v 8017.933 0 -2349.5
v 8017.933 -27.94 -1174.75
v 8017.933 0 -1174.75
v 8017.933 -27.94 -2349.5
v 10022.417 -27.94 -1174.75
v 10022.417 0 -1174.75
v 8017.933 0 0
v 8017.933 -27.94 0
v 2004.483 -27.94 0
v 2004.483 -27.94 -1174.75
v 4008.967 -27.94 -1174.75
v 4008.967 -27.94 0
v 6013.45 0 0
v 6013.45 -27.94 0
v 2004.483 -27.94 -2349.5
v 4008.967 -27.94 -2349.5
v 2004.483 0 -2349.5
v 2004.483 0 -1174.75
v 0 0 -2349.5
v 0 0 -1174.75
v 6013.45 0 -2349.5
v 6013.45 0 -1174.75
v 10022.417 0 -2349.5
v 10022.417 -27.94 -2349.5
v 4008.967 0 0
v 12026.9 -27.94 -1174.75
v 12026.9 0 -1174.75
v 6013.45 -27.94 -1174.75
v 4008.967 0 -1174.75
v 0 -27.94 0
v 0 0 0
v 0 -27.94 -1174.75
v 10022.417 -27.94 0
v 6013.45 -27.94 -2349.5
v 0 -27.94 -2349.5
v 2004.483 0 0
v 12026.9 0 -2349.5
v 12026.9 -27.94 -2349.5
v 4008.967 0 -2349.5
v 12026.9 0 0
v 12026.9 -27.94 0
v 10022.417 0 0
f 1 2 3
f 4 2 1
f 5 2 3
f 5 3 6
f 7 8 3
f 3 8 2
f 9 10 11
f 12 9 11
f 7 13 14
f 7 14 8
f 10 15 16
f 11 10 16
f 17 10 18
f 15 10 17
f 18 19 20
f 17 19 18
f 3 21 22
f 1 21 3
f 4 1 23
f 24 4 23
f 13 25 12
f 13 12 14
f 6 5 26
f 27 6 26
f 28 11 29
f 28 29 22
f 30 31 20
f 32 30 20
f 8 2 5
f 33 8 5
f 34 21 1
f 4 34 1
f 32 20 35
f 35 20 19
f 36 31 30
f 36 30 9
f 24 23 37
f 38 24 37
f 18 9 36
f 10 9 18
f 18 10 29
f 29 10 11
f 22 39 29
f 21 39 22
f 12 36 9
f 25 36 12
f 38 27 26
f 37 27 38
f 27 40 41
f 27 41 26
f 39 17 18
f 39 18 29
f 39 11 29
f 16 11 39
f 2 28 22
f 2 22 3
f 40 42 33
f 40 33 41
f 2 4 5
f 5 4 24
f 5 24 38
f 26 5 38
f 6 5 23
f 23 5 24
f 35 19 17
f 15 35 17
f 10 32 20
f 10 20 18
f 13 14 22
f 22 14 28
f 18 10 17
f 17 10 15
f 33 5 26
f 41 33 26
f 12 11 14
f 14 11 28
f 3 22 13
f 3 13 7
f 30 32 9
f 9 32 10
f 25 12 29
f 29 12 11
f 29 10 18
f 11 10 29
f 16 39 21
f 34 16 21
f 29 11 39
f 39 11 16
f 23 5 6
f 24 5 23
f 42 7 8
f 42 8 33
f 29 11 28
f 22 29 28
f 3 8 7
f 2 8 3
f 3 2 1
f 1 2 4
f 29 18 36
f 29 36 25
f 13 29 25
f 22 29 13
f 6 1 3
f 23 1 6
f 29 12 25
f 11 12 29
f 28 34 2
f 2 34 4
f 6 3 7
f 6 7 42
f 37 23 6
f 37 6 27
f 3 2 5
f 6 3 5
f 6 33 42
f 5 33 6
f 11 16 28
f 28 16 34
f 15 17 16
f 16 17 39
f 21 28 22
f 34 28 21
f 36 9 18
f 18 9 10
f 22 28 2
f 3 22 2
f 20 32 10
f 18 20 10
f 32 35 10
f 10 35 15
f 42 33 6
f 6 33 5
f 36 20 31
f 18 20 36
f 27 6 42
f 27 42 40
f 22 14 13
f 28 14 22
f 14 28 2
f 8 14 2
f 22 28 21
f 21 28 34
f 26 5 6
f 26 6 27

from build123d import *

# Parameters (mm, degrees)
SKETCH1_W                 = 12026.9
SKETCH1_H                 = 2349.5
BOSS_EXTRUDE1_DEPTH       = 27.94
SPLIT1_SURFACE_1_1_BACK   = 12255.275
SPLIT1_SURFACE_1_1_DEPTH  = 24510.55
SPLIT1_SURFACE_1_2_BACK   = 12255.275
SPLIT1_SURFACE_1_2_DEPTH  = 24510.55
SPLIT1_SURFACE_2_3_BACK   = 12255.275
SPLIT1_SURFACE_2_3_DEPTH  = 24510.55
SPLIT1_SURFACE_2_4_BACK   = 12255.275
SPLIT1_SURFACE_2_4_DEPTH  = 24510.55
SPLIT1_SURFACE_2_5_BACK   = 12255.275
SPLIT1_SURFACE_2_5_DEPTH  = 24510.55
SPLIT1_SURFACE_2_6_BACK   = 12255.275
SPLIT1_SURFACE_2_6_DEPTH  = 24510.55
SPLIT1_SURFACE_3_7_BACK   = 12255.275
SPLIT1_SURFACE_3_7_DEPTH  = 24510.55
SPLIT1_SURFACE_3_8_BACK   = 12255.275
SPLIT1_SURFACE_3_8_DEPTH  = 24510.55
SPLIT1_SURFACE_3_9_BACK   = 12255.275
SPLIT1_SURFACE_3_9_DEPTH  = 24510.55
SPLIT1_SURFACE_3_10_BACK  = 12255.275
SPLIT1_SURFACE_3_10_DEPTH = 24510.55
SPLIT1_SURFACE_4_11_BACK  = 12255.275
SPLIT1_SURFACE_4_11_DEPTH = 24510.55
SPLIT1_SURFACE_4_12_BACK  = 12255.275
SPLIT1_SURFACE_4_12_DEPTH = 24510.55
SPLIT1_SURFACE_4_13_BACK  = 12255.275
SPLIT1_SURFACE_4_13_DEPTH = 24510.55
SPLIT1_SURFACE_4_14_BACK  = 12255.275
SPLIT1_SURFACE_4_14_DEPTH = 24510.55
SPLIT1_SURFACE_5_15_BACK  = 12255.275
SPLIT1_SURFACE_5_15_DEPTH = 24510.55
SPLIT1_SURFACE_5_16_BACK  = 12255.275
SPLIT1_SURFACE_5_16_DEPTH = 24510.55
SPLIT1_SURFACE_5_17_BACK  = 12255.275
SPLIT1_SURFACE_5_17_DEPTH = 24510.55
SPLIT1_SURFACE_5_18_BACK  = 12255.275
SPLIT1_SURFACE_5_18_DEPTH = 24510.55
SPLIT1_SURFACE_6_19_BACK  = 12255.275
SPLIT1_SURFACE_6_19_DEPTH = 24510.55
SPLIT1_SURFACE_6_20_BACK  = 12255.275
SPLIT1_SURFACE_6_20_DEPTH = 24510.55
SPLIT1_SURFACE_6_21_BACK  = 12255.275
SPLIT1_SURFACE_6_21_DEPTH = 24510.55
SPLIT1_SURFACE_6_22_BACK  = 12255.275
SPLIT1_SURFACE_6_22_DEPTH = 24510.55


with BuildPart() as part:
    # Sketch1 → Boss-Extrude1 (new body)
    with BuildSketch(Plane(origin=(0, 0, 0), x_dir=(1, 0, 0), z_dir=(0, 1, 0))):
        with Locations((6013.45, 1174.75)):
            Rectangle(SKETCH1_W, SKETCH1_H)
    extrude(amount=-BOSS_EXTRUDE1_DEPTH)


with BuildPart() as body_2:
    # Split1: the piece behind the surface
    add(part.part)
    # Split1 surface 1: a surface, the sketch's curves swept straight by 24510.55 mm
    with BuildLine(Plane(origin=(0, 0, 0), x_dir=(1, 0, 0), z_dir=(0, 1, 0)).offset(-SPLIT1_SURFACE_1_1_BACK), mode=Mode.PRIVATE) as split1_surface_1_1_path:
        Line((0, 1174.75), (12026.9, 1174.75))
    split1_surface_1_1 = Shell.extrude(split1_surface_1_1_path.wire(), (0 * SPLIT1_SURFACE_1_1_DEPTH, 1 * SPLIT1_SURFACE_1_1_DEPTH, 0 * SPLIT1_SURFACE_1_1_DEPTH))
    split(bisect_by=split1_surface_1_1, keep=Keep.BOTTOM)


with BuildPart() as part_1:
    add(part.part)

    # Split1: split by a surface, the side it looks to stays
    # Split1 surface 1: a surface, the sketch's curves swept straight by 24510.55 mm
    with BuildLine(Plane(origin=(0, 0, 0), x_dir=(1, 0, 0), z_dir=(0, 1, 0)).offset(-SPLIT1_SURFACE_1_2_BACK), mode=Mode.PRIVATE) as split1_surface_1_2_path:
        Line((0, 1174.75), (12026.9, 1174.75))
    split1_surface_1_2 = Shell.extrude(split1_surface_1_2_path.wire(), (0 * SPLIT1_SURFACE_1_2_DEPTH, 1 * SPLIT1_SURFACE_1_2_DEPTH, 0 * SPLIT1_SURFACE_1_2_DEPTH))
    split(bisect_by=split1_surface_1_2, keep=Keep.TOP)


with BuildPart() as body_3:
    # Split1 2: the piece behind the surface
    add(part_1.part)
    # Split1 surface 2: a surface, the sketch's curves swept straight by 24510.55 mm
    with BuildLine(Plane(origin=(0, 0, 0), x_dir=(1, 0, 0), z_dir=(0, 1, 0)).offset(-SPLIT1_SURFACE_2_3_BACK), mode=Mode.PRIVATE) as split1_surface_2_3_path:
        Line((2004.483333333, 0), (2004.483333333, 2349.5))
    split1_surface_2_3 = Shell.extrude(split1_surface_2_3_path.wire(), (0 * SPLIT1_SURFACE_2_3_DEPTH, 1 * SPLIT1_SURFACE_2_3_DEPTH, 0 * SPLIT1_SURFACE_2_3_DEPTH))
    split(bisect_by=split1_surface_2_3, keep=Keep.BOTTOM)


with BuildPart() as part_2:
    add(part_1.part)

    # Split1 2: split by a surface, the side it looks to stays
    # Split1 surface 2: a surface, the sketch's curves swept straight by 24510.55 mm
    with BuildLine(Plane(origin=(0, 0, 0), x_dir=(1, 0, 0), z_dir=(0, 1, 0)).offset(-SPLIT1_SURFACE_2_4_BACK), mode=Mode.PRIVATE) as split1_surface_2_4_path:
        Line((2004.483333333, 0), (2004.483333333, 2349.5))
    split1_surface_2_4 = Shell.extrude(split1_surface_2_4_path.wire(), (0 * SPLIT1_SURFACE_2_4_DEPTH, 1 * SPLIT1_SURFACE_2_4_DEPTH, 0 * SPLIT1_SURFACE_2_4_DEPTH))
    split(bisect_by=split1_surface_2_4, keep=Keep.TOP)


with BuildPart() as body_4:
    # Split1 2 body 2: the piece behind the surface
    add(body_2.part)
    # Split1 surface 2: a surface, the sketch's curves swept straight by 24510.55 mm
    with BuildLine(Plane(origin=(0, 0, 0), x_dir=(1, 0, 0), z_dir=(0, 1, 0)).offset(-SPLIT1_SURFACE_2_5_BACK), mode=Mode.PRIVATE) as split1_surface_2_5_path:
        Line((2004.483333333, 0), (2004.483333333, 2349.5))
    split1_surface_2_5 = Shell.extrude(split1_surface_2_5_path.wire(), (0 * SPLIT1_SURFACE_2_5_DEPTH, 1 * SPLIT1_SURFACE_2_5_DEPTH, 0 * SPLIT1_SURFACE_2_5_DEPTH))
    split(bisect_by=split1_surface_2_5, keep=Keep.BOTTOM)


with BuildPart() as body_2_1:
    add(body_2.part)

    # Split1 2 body 2: split by a surface, the side it looks to stays
    # Split1 surface 2: a surface, the sketch's curves swept straight by 24510.55 mm
    with BuildLine(Plane(origin=(0, 0, 0), x_dir=(1, 0, 0), z_dir=(0, 1, 0)).offset(-SPLIT1_SURFACE_2_6_BACK), mode=Mode.PRIVATE) as split1_surface_2_6_path:
        Line((2004.483333333, 0), (2004.483333333, 2349.5))
    split1_surface_2_6 = Shell.extrude(split1_surface_2_6_path.wire(), (0 * SPLIT1_SURFACE_2_6_DEPTH, 1 * SPLIT1_SURFACE_2_6_DEPTH, 0 * SPLIT1_SURFACE_2_6_DEPTH))
    split(bisect_by=split1_surface_2_6, keep=Keep.TOP)


with BuildPart() as body_5:
    # Split1 3 body 3: the piece behind the surface
    add(body_3.part)
    # Split1 surface 3: a surface, the sketch's curves swept straight by 24510.55 mm
    with BuildLine(Plane(origin=(0, 0, 0), x_dir=(1, 0, 0), z_dir=(0, 1, 0)).offset(-SPLIT1_SURFACE_3_7_BACK), mode=Mode.PRIVATE) as split1_surface_3_7_path:
        Line((4008.966666667, 0), (4008.966666667, 2349.5))
    split1_surface_3_7 = Shell.extrude(split1_surface_3_7_path.wire(), (0 * SPLIT1_SURFACE_3_7_DEPTH, 1 * SPLIT1_SURFACE_3_7_DEPTH, 0 * SPLIT1_SURFACE_3_7_DEPTH))
    split(bisect_by=split1_surface_3_7, keep=Keep.BOTTOM)


with BuildPart() as body_3_1:
    add(body_3.part)

    # Split1 3 body 3: split by a surface, the side it looks to stays
    # Split1 surface 3: a surface, the sketch's curves swept straight by 24510.55 mm
    with BuildLine(Plane(origin=(0, 0, 0), x_dir=(1, 0, 0), z_dir=(0, 1, 0)).offset(-SPLIT1_SURFACE_3_8_BACK), mode=Mode.PRIVATE) as split1_surface_3_8_path:
        Line((4008.966666667, 0), (4008.966666667, 2349.5))
    split1_surface_3_8 = Shell.extrude(split1_surface_3_8_path.wire(), (0 * SPLIT1_SURFACE_3_8_DEPTH, 1 * SPLIT1_SURFACE_3_8_DEPTH, 0 * SPLIT1_SURFACE_3_8_DEPTH))
    split(bisect_by=split1_surface_3_8, keep=Keep.TOP)


with BuildPart() as body_6:
    # Split1 3 body 4: the piece behind the surface
    add(body_4.part)
    # Split1 surface 3: a surface, the sketch's curves swept straight by 24510.55 mm
    with BuildLine(Plane(origin=(0, 0, 0), x_dir=(1, 0, 0), z_dir=(0, 1, 0)).offset(-SPLIT1_SURFACE_3_9_BACK), mode=Mode.PRIVATE) as split1_surface_3_9_path:
        Line((4008.966666667, 0), (4008.966666667, 2349.5))
    split1_surface_3_9 = Shell.extrude(split1_surface_3_9_path.wire(), (0 * SPLIT1_SURFACE_3_9_DEPTH, 1 * SPLIT1_SURFACE_3_9_DEPTH, 0 * SPLIT1_SURFACE_3_9_DEPTH))
    split(bisect_by=split1_surface_3_9, keep=Keep.BOTTOM)


with BuildPart() as body_4_1:
    add(body_4.part)

    # Split1 3 body 4: split by a surface, the side it looks to stays
    # Split1 surface 3: a surface, the sketch's curves swept straight by 24510.55 mm
    with BuildLine(Plane(origin=(0, 0, 0), x_dir=(1, 0, 0), z_dir=(0, 1, 0)).offset(-SPLIT1_SURFACE_3_10_BACK), mode=Mode.PRIVATE) as split1_surface_3_10_path:
        Line((4008.966666667, 0), (4008.966666667, 2349.5))
    split1_surface_3_10 = Shell.extrude(split1_surface_3_10_path.wire(), (0 * SPLIT1_SURFACE_3_10_DEPTH, 1 * SPLIT1_SURFACE_3_10_DEPTH, 0 * SPLIT1_SURFACE_3_10_DEPTH))
    split(bisect_by=split1_surface_3_10, keep=Keep.TOP)


with BuildPart() as body_7:
    # Split1 4 body 5: the piece behind the surface
    add(body_5.part)
    # Split1 surface 4: a surface, the sketch's curves swept straight by 24510.55 mm
    with BuildLine(Plane(origin=(0, 0, 0), x_dir=(1, 0, 0), z_dir=(0, 1, 0)).offset(-SPLIT1_SURFACE_4_11_BACK), mode=Mode.PRIVATE) as split1_surface_4_11_path:
        Line((10022.416666667, 0), (10022.416666667, 2349.5))
    split1_surface_4_11 = Shell.extrude(split1_surface_4_11_path.wire(), (0 * SPLIT1_SURFACE_4_11_DEPTH, 1 * SPLIT1_SURFACE_4_11_DEPTH, 0 * SPLIT1_SURFACE_4_11_DEPTH))
    split(bisect_by=split1_surface_4_11, keep=Keep.BOTTOM)


with BuildPart() as body_5_1:
    add(body_5.part)

    # Split1 4 body 5: split by a surface, the side it looks to stays
    # Split1 surface 4: a surface, the sketch's curves swept straight by 24510.55 mm
    with BuildLine(Plane(origin=(0, 0, 0), x_dir=(1, 0, 0), z_dir=(0, 1, 0)).offset(-SPLIT1_SURFACE_4_12_BACK), mode=Mode.PRIVATE) as split1_surface_4_12_path:
        Line((10022.416666667, 0), (10022.416666667, 2349.5))
    split1_surface_4_12 = Shell.extrude(split1_surface_4_12_path.wire(), (0 * SPLIT1_SURFACE_4_12_DEPTH, 1 * SPLIT1_SURFACE_4_12_DEPTH, 0 * SPLIT1_SURFACE_4_12_DEPTH))
    split(bisect_by=split1_surface_4_12, keep=Keep.TOP)


with BuildPart() as body_8:
    # Split1 4 body 6: the piece behind the surface
    add(body_6.part)
    # Split1 surface 4: a surface, the sketch's curves swept straight by 24510.55 mm
    with BuildLine(Plane(origin=(0, 0, 0), x_dir=(1, 0, 0), z_dir=(0, 1, 0)).offset(-SPLIT1_SURFACE_4_13_BACK), mode=Mode.PRIVATE) as split1_surface_4_13_path:
        Line((10022.416666667, 0), (10022.416666667, 2349.5))
    split1_surface_4_13 = Shell.extrude(split1_surface_4_13_path.wire(), (0 * SPLIT1_SURFACE_4_13_DEPTH, 1 * SPLIT1_SURFACE_4_13_DEPTH, 0 * SPLIT1_SURFACE_4_13_DEPTH))
    split(bisect_by=split1_surface_4_13, keep=Keep.BOTTOM)


with BuildPart() as body_6_1:
    add(body_6.part)

    # Split1 4 body 6: split by a surface, the side it looks to stays
    # Split1 surface 4: a surface, the sketch's curves swept straight by 24510.55 mm
    with BuildLine(Plane(origin=(0, 0, 0), x_dir=(1, 0, 0), z_dir=(0, 1, 0)).offset(-SPLIT1_SURFACE_4_14_BACK), mode=Mode.PRIVATE) as split1_surface_4_14_path:
        Line((10022.416666667, 0), (10022.416666667, 2349.5))
    split1_surface_4_14 = Shell.extrude(split1_surface_4_14_path.wire(), (0 * SPLIT1_SURFACE_4_14_DEPTH, 1 * SPLIT1_SURFACE_4_14_DEPTH, 0 * SPLIT1_SURFACE_4_14_DEPTH))
    split(bisect_by=split1_surface_4_14, keep=Keep.TOP)


with BuildPart() as body_9:
    # Split1 5 body 5: the piece behind the surface
    add(body_5_1.part)
    # Split1 surface 5: a surface, the sketch's curves swept straight by 24510.55 mm
    with BuildLine(Plane(origin=(0, 0, 0), x_dir=(1, 0, 0), z_dir=(0, 1, 0)).offset(-SPLIT1_SURFACE_5_15_BACK), mode=Mode.PRIVATE) as split1_surface_5_15_path:
        Line((8017.933333333, 0), (8017.933333333, 2349.5))
    split1_surface_5_15 = Shell.extrude(split1_surface_5_15_path.wire(), (0 * SPLIT1_SURFACE_5_15_DEPTH, 1 * SPLIT1_SURFACE_5_15_DEPTH, 0 * SPLIT1_SURFACE_5_15_DEPTH))
    split(bisect_by=split1_surface_5_15, keep=Keep.BOTTOM)


with BuildPart() as body_5_2:
    add(body_5_1.part)

    # Split1 5 body 5: split by a surface, the side it looks to stays
    # Split1 surface 5: a surface, the sketch's curves swept straight by 24510.55 mm
    with BuildLine(Plane(origin=(0, 0, 0), x_dir=(1, 0, 0), z_dir=(0, 1, 0)).offset(-SPLIT1_SURFACE_5_16_BACK), mode=Mode.PRIVATE) as split1_surface_5_16_path:
        Line((8017.933333333, 0), (8017.933333333, 2349.5))
    split1_surface_5_16 = Shell.extrude(split1_surface_5_16_path.wire(), (0 * SPLIT1_SURFACE_5_16_DEPTH, 1 * SPLIT1_SURFACE_5_16_DEPTH, 0 * SPLIT1_SURFACE_5_16_DEPTH))
    split(bisect_by=split1_surface_5_16, keep=Keep.TOP)


with BuildPart() as body_10:
    # Split1 5 body 6: the piece behind the surface
    add(body_6_1.part)
    # Split1 surface 5: a surface, the sketch's curves swept straight by 24510.55 mm
    with BuildLine(Plane(origin=(0, 0, 0), x_dir=(1, 0, 0), z_dir=(0, 1, 0)).offset(-SPLIT1_SURFACE_5_17_BACK), mode=Mode.PRIVATE) as split1_surface_5_17_path:
        Line((8017.933333333, 0), (8017.933333333, 2349.5))
    split1_surface_5_17 = Shell.extrude(split1_surface_5_17_path.wire(), (0 * SPLIT1_SURFACE_5_17_DEPTH, 1 * SPLIT1_SURFACE_5_17_DEPTH, 0 * SPLIT1_SURFACE_5_17_DEPTH))
    split(bisect_by=split1_surface_5_17, keep=Keep.BOTTOM)


with BuildPart() as body_6_2:
    add(body_6_1.part)

    # Split1 5 body 6: split by a surface, the side it looks to stays
    # Split1 surface 5: a surface, the sketch's curves swept straight by 24510.55 mm
    with BuildLine(Plane(origin=(0, 0, 0), x_dir=(1, 0, 0), z_dir=(0, 1, 0)).offset(-SPLIT1_SURFACE_5_18_BACK), mode=Mode.PRIVATE) as split1_surface_5_18_path:
        Line((8017.933333333, 0), (8017.933333333, 2349.5))
    split1_surface_5_18 = Shell.extrude(split1_surface_5_18_path.wire(), (0 * SPLIT1_SURFACE_5_18_DEPTH, 1 * SPLIT1_SURFACE_5_18_DEPTH, 0 * SPLIT1_SURFACE_5_18_DEPTH))
    split(bisect_by=split1_surface_5_18, keep=Keep.TOP)


with BuildPart() as body_11_2:
    # Split1 6 body 5: the piece behind the surface
    add(body_5_2.part)
    # Split1 surface 6: a surface, the sketch's curves swept straight by 24510.55 mm
    with BuildLine(Plane(origin=(0, 0, 0), x_dir=(1, 0, 0), z_dir=(0, 1, 0)).offset(-SPLIT1_SURFACE_6_19_BACK), mode=Mode.PRIVATE) as split1_surface_6_19_path:
        Line((6013.45, 0), (6013.45, 2349.5))
    split1_surface_6_19 = Shell.extrude(split1_surface_6_19_path.wire(), (0 * SPLIT1_SURFACE_6_19_DEPTH, 1 * SPLIT1_SURFACE_6_19_DEPTH, 0 * SPLIT1_SURFACE_6_19_DEPTH))
    split(bisect_by=split1_surface_6_19, keep=Keep.BOTTOM)


with BuildPart() as body_5_3:
    add(body_5_2.part)

    # Split1 6 body 5: split by a surface, the side it looks to stays
    # Split1 surface 6: a surface, the sketch's curves swept straight by 24510.55 mm
    with BuildLine(Plane(origin=(0, 0, 0), x_dir=(1, 0, 0), z_dir=(0, 1, 0)).offset(-SPLIT1_SURFACE_6_20_BACK), mode=Mode.PRIVATE) as split1_surface_6_20_path:
        Line((6013.45, 0), (6013.45, 2349.5))
    split1_surface_6_20 = Shell.extrude(split1_surface_6_20_path.wire(), (0 * SPLIT1_SURFACE_6_20_DEPTH, 1 * SPLIT1_SURFACE_6_20_DEPTH, 0 * SPLIT1_SURFACE_6_20_DEPTH))
    split(bisect_by=split1_surface_6_20, keep=Keep.TOP)


with BuildPart() as body_12:
    # Split1 6 body 6: the piece behind the surface
    add(body_6_2.part)
    # Split1 surface 6: a surface, the sketch's curves swept straight by 24510.55 mm
    with BuildLine(Plane(origin=(0, 0, 0), x_dir=(1, 0, 0), z_dir=(0, 1, 0)).offset(-SPLIT1_SURFACE_6_21_BACK), mode=Mode.PRIVATE) as split1_surface_6_21_path:
        Line((6013.45, 0), (6013.45, 2349.5))
    split1_surface_6_21 = Shell.extrude(split1_surface_6_21_path.wire(), (0 * SPLIT1_SURFACE_6_21_DEPTH, 1 * SPLIT1_SURFACE_6_21_DEPTH, 0 * SPLIT1_SURFACE_6_21_DEPTH))
    split(bisect_by=split1_surface_6_21, keep=Keep.BOTTOM)


with BuildPart() as body_6_3:
    add(body_6_2.part)

    # Split1 6 body 6: split by a surface, the side it looks to stays
    # Split1 surface 6: a surface, the sketch's curves swept straight by 24510.55 mm
    with BuildLine(Plane(origin=(0, 0, 0), x_dir=(1, 0, 0), z_dir=(0, 1, 0)).offset(-SPLIT1_SURFACE_6_22_BACK), mode=Mode.PRIVATE) as split1_surface_6_22_path:
        Line((6013.45, 0), (6013.45, 2349.5))
    split1_surface_6_22 = Shell.extrude(split1_surface_6_22_path.wire(), (0 * SPLIT1_SURFACE_6_22_DEPTH, 1 * SPLIT1_SURFACE_6_22_DEPTH, 0 * SPLIT1_SURFACE_6_22_DEPTH))
    split(bisect_by=split1_surface_6_22, keep=Keep.TOP)


solid = Compound([part_2.part, body_2_1.part, body_3_1.part, body_4_1.part, body_7.part, body_8.part, body_9.part, body_10.part, body_11_2.part, body_5_3.part, body_12.part, body_6_3.part])
